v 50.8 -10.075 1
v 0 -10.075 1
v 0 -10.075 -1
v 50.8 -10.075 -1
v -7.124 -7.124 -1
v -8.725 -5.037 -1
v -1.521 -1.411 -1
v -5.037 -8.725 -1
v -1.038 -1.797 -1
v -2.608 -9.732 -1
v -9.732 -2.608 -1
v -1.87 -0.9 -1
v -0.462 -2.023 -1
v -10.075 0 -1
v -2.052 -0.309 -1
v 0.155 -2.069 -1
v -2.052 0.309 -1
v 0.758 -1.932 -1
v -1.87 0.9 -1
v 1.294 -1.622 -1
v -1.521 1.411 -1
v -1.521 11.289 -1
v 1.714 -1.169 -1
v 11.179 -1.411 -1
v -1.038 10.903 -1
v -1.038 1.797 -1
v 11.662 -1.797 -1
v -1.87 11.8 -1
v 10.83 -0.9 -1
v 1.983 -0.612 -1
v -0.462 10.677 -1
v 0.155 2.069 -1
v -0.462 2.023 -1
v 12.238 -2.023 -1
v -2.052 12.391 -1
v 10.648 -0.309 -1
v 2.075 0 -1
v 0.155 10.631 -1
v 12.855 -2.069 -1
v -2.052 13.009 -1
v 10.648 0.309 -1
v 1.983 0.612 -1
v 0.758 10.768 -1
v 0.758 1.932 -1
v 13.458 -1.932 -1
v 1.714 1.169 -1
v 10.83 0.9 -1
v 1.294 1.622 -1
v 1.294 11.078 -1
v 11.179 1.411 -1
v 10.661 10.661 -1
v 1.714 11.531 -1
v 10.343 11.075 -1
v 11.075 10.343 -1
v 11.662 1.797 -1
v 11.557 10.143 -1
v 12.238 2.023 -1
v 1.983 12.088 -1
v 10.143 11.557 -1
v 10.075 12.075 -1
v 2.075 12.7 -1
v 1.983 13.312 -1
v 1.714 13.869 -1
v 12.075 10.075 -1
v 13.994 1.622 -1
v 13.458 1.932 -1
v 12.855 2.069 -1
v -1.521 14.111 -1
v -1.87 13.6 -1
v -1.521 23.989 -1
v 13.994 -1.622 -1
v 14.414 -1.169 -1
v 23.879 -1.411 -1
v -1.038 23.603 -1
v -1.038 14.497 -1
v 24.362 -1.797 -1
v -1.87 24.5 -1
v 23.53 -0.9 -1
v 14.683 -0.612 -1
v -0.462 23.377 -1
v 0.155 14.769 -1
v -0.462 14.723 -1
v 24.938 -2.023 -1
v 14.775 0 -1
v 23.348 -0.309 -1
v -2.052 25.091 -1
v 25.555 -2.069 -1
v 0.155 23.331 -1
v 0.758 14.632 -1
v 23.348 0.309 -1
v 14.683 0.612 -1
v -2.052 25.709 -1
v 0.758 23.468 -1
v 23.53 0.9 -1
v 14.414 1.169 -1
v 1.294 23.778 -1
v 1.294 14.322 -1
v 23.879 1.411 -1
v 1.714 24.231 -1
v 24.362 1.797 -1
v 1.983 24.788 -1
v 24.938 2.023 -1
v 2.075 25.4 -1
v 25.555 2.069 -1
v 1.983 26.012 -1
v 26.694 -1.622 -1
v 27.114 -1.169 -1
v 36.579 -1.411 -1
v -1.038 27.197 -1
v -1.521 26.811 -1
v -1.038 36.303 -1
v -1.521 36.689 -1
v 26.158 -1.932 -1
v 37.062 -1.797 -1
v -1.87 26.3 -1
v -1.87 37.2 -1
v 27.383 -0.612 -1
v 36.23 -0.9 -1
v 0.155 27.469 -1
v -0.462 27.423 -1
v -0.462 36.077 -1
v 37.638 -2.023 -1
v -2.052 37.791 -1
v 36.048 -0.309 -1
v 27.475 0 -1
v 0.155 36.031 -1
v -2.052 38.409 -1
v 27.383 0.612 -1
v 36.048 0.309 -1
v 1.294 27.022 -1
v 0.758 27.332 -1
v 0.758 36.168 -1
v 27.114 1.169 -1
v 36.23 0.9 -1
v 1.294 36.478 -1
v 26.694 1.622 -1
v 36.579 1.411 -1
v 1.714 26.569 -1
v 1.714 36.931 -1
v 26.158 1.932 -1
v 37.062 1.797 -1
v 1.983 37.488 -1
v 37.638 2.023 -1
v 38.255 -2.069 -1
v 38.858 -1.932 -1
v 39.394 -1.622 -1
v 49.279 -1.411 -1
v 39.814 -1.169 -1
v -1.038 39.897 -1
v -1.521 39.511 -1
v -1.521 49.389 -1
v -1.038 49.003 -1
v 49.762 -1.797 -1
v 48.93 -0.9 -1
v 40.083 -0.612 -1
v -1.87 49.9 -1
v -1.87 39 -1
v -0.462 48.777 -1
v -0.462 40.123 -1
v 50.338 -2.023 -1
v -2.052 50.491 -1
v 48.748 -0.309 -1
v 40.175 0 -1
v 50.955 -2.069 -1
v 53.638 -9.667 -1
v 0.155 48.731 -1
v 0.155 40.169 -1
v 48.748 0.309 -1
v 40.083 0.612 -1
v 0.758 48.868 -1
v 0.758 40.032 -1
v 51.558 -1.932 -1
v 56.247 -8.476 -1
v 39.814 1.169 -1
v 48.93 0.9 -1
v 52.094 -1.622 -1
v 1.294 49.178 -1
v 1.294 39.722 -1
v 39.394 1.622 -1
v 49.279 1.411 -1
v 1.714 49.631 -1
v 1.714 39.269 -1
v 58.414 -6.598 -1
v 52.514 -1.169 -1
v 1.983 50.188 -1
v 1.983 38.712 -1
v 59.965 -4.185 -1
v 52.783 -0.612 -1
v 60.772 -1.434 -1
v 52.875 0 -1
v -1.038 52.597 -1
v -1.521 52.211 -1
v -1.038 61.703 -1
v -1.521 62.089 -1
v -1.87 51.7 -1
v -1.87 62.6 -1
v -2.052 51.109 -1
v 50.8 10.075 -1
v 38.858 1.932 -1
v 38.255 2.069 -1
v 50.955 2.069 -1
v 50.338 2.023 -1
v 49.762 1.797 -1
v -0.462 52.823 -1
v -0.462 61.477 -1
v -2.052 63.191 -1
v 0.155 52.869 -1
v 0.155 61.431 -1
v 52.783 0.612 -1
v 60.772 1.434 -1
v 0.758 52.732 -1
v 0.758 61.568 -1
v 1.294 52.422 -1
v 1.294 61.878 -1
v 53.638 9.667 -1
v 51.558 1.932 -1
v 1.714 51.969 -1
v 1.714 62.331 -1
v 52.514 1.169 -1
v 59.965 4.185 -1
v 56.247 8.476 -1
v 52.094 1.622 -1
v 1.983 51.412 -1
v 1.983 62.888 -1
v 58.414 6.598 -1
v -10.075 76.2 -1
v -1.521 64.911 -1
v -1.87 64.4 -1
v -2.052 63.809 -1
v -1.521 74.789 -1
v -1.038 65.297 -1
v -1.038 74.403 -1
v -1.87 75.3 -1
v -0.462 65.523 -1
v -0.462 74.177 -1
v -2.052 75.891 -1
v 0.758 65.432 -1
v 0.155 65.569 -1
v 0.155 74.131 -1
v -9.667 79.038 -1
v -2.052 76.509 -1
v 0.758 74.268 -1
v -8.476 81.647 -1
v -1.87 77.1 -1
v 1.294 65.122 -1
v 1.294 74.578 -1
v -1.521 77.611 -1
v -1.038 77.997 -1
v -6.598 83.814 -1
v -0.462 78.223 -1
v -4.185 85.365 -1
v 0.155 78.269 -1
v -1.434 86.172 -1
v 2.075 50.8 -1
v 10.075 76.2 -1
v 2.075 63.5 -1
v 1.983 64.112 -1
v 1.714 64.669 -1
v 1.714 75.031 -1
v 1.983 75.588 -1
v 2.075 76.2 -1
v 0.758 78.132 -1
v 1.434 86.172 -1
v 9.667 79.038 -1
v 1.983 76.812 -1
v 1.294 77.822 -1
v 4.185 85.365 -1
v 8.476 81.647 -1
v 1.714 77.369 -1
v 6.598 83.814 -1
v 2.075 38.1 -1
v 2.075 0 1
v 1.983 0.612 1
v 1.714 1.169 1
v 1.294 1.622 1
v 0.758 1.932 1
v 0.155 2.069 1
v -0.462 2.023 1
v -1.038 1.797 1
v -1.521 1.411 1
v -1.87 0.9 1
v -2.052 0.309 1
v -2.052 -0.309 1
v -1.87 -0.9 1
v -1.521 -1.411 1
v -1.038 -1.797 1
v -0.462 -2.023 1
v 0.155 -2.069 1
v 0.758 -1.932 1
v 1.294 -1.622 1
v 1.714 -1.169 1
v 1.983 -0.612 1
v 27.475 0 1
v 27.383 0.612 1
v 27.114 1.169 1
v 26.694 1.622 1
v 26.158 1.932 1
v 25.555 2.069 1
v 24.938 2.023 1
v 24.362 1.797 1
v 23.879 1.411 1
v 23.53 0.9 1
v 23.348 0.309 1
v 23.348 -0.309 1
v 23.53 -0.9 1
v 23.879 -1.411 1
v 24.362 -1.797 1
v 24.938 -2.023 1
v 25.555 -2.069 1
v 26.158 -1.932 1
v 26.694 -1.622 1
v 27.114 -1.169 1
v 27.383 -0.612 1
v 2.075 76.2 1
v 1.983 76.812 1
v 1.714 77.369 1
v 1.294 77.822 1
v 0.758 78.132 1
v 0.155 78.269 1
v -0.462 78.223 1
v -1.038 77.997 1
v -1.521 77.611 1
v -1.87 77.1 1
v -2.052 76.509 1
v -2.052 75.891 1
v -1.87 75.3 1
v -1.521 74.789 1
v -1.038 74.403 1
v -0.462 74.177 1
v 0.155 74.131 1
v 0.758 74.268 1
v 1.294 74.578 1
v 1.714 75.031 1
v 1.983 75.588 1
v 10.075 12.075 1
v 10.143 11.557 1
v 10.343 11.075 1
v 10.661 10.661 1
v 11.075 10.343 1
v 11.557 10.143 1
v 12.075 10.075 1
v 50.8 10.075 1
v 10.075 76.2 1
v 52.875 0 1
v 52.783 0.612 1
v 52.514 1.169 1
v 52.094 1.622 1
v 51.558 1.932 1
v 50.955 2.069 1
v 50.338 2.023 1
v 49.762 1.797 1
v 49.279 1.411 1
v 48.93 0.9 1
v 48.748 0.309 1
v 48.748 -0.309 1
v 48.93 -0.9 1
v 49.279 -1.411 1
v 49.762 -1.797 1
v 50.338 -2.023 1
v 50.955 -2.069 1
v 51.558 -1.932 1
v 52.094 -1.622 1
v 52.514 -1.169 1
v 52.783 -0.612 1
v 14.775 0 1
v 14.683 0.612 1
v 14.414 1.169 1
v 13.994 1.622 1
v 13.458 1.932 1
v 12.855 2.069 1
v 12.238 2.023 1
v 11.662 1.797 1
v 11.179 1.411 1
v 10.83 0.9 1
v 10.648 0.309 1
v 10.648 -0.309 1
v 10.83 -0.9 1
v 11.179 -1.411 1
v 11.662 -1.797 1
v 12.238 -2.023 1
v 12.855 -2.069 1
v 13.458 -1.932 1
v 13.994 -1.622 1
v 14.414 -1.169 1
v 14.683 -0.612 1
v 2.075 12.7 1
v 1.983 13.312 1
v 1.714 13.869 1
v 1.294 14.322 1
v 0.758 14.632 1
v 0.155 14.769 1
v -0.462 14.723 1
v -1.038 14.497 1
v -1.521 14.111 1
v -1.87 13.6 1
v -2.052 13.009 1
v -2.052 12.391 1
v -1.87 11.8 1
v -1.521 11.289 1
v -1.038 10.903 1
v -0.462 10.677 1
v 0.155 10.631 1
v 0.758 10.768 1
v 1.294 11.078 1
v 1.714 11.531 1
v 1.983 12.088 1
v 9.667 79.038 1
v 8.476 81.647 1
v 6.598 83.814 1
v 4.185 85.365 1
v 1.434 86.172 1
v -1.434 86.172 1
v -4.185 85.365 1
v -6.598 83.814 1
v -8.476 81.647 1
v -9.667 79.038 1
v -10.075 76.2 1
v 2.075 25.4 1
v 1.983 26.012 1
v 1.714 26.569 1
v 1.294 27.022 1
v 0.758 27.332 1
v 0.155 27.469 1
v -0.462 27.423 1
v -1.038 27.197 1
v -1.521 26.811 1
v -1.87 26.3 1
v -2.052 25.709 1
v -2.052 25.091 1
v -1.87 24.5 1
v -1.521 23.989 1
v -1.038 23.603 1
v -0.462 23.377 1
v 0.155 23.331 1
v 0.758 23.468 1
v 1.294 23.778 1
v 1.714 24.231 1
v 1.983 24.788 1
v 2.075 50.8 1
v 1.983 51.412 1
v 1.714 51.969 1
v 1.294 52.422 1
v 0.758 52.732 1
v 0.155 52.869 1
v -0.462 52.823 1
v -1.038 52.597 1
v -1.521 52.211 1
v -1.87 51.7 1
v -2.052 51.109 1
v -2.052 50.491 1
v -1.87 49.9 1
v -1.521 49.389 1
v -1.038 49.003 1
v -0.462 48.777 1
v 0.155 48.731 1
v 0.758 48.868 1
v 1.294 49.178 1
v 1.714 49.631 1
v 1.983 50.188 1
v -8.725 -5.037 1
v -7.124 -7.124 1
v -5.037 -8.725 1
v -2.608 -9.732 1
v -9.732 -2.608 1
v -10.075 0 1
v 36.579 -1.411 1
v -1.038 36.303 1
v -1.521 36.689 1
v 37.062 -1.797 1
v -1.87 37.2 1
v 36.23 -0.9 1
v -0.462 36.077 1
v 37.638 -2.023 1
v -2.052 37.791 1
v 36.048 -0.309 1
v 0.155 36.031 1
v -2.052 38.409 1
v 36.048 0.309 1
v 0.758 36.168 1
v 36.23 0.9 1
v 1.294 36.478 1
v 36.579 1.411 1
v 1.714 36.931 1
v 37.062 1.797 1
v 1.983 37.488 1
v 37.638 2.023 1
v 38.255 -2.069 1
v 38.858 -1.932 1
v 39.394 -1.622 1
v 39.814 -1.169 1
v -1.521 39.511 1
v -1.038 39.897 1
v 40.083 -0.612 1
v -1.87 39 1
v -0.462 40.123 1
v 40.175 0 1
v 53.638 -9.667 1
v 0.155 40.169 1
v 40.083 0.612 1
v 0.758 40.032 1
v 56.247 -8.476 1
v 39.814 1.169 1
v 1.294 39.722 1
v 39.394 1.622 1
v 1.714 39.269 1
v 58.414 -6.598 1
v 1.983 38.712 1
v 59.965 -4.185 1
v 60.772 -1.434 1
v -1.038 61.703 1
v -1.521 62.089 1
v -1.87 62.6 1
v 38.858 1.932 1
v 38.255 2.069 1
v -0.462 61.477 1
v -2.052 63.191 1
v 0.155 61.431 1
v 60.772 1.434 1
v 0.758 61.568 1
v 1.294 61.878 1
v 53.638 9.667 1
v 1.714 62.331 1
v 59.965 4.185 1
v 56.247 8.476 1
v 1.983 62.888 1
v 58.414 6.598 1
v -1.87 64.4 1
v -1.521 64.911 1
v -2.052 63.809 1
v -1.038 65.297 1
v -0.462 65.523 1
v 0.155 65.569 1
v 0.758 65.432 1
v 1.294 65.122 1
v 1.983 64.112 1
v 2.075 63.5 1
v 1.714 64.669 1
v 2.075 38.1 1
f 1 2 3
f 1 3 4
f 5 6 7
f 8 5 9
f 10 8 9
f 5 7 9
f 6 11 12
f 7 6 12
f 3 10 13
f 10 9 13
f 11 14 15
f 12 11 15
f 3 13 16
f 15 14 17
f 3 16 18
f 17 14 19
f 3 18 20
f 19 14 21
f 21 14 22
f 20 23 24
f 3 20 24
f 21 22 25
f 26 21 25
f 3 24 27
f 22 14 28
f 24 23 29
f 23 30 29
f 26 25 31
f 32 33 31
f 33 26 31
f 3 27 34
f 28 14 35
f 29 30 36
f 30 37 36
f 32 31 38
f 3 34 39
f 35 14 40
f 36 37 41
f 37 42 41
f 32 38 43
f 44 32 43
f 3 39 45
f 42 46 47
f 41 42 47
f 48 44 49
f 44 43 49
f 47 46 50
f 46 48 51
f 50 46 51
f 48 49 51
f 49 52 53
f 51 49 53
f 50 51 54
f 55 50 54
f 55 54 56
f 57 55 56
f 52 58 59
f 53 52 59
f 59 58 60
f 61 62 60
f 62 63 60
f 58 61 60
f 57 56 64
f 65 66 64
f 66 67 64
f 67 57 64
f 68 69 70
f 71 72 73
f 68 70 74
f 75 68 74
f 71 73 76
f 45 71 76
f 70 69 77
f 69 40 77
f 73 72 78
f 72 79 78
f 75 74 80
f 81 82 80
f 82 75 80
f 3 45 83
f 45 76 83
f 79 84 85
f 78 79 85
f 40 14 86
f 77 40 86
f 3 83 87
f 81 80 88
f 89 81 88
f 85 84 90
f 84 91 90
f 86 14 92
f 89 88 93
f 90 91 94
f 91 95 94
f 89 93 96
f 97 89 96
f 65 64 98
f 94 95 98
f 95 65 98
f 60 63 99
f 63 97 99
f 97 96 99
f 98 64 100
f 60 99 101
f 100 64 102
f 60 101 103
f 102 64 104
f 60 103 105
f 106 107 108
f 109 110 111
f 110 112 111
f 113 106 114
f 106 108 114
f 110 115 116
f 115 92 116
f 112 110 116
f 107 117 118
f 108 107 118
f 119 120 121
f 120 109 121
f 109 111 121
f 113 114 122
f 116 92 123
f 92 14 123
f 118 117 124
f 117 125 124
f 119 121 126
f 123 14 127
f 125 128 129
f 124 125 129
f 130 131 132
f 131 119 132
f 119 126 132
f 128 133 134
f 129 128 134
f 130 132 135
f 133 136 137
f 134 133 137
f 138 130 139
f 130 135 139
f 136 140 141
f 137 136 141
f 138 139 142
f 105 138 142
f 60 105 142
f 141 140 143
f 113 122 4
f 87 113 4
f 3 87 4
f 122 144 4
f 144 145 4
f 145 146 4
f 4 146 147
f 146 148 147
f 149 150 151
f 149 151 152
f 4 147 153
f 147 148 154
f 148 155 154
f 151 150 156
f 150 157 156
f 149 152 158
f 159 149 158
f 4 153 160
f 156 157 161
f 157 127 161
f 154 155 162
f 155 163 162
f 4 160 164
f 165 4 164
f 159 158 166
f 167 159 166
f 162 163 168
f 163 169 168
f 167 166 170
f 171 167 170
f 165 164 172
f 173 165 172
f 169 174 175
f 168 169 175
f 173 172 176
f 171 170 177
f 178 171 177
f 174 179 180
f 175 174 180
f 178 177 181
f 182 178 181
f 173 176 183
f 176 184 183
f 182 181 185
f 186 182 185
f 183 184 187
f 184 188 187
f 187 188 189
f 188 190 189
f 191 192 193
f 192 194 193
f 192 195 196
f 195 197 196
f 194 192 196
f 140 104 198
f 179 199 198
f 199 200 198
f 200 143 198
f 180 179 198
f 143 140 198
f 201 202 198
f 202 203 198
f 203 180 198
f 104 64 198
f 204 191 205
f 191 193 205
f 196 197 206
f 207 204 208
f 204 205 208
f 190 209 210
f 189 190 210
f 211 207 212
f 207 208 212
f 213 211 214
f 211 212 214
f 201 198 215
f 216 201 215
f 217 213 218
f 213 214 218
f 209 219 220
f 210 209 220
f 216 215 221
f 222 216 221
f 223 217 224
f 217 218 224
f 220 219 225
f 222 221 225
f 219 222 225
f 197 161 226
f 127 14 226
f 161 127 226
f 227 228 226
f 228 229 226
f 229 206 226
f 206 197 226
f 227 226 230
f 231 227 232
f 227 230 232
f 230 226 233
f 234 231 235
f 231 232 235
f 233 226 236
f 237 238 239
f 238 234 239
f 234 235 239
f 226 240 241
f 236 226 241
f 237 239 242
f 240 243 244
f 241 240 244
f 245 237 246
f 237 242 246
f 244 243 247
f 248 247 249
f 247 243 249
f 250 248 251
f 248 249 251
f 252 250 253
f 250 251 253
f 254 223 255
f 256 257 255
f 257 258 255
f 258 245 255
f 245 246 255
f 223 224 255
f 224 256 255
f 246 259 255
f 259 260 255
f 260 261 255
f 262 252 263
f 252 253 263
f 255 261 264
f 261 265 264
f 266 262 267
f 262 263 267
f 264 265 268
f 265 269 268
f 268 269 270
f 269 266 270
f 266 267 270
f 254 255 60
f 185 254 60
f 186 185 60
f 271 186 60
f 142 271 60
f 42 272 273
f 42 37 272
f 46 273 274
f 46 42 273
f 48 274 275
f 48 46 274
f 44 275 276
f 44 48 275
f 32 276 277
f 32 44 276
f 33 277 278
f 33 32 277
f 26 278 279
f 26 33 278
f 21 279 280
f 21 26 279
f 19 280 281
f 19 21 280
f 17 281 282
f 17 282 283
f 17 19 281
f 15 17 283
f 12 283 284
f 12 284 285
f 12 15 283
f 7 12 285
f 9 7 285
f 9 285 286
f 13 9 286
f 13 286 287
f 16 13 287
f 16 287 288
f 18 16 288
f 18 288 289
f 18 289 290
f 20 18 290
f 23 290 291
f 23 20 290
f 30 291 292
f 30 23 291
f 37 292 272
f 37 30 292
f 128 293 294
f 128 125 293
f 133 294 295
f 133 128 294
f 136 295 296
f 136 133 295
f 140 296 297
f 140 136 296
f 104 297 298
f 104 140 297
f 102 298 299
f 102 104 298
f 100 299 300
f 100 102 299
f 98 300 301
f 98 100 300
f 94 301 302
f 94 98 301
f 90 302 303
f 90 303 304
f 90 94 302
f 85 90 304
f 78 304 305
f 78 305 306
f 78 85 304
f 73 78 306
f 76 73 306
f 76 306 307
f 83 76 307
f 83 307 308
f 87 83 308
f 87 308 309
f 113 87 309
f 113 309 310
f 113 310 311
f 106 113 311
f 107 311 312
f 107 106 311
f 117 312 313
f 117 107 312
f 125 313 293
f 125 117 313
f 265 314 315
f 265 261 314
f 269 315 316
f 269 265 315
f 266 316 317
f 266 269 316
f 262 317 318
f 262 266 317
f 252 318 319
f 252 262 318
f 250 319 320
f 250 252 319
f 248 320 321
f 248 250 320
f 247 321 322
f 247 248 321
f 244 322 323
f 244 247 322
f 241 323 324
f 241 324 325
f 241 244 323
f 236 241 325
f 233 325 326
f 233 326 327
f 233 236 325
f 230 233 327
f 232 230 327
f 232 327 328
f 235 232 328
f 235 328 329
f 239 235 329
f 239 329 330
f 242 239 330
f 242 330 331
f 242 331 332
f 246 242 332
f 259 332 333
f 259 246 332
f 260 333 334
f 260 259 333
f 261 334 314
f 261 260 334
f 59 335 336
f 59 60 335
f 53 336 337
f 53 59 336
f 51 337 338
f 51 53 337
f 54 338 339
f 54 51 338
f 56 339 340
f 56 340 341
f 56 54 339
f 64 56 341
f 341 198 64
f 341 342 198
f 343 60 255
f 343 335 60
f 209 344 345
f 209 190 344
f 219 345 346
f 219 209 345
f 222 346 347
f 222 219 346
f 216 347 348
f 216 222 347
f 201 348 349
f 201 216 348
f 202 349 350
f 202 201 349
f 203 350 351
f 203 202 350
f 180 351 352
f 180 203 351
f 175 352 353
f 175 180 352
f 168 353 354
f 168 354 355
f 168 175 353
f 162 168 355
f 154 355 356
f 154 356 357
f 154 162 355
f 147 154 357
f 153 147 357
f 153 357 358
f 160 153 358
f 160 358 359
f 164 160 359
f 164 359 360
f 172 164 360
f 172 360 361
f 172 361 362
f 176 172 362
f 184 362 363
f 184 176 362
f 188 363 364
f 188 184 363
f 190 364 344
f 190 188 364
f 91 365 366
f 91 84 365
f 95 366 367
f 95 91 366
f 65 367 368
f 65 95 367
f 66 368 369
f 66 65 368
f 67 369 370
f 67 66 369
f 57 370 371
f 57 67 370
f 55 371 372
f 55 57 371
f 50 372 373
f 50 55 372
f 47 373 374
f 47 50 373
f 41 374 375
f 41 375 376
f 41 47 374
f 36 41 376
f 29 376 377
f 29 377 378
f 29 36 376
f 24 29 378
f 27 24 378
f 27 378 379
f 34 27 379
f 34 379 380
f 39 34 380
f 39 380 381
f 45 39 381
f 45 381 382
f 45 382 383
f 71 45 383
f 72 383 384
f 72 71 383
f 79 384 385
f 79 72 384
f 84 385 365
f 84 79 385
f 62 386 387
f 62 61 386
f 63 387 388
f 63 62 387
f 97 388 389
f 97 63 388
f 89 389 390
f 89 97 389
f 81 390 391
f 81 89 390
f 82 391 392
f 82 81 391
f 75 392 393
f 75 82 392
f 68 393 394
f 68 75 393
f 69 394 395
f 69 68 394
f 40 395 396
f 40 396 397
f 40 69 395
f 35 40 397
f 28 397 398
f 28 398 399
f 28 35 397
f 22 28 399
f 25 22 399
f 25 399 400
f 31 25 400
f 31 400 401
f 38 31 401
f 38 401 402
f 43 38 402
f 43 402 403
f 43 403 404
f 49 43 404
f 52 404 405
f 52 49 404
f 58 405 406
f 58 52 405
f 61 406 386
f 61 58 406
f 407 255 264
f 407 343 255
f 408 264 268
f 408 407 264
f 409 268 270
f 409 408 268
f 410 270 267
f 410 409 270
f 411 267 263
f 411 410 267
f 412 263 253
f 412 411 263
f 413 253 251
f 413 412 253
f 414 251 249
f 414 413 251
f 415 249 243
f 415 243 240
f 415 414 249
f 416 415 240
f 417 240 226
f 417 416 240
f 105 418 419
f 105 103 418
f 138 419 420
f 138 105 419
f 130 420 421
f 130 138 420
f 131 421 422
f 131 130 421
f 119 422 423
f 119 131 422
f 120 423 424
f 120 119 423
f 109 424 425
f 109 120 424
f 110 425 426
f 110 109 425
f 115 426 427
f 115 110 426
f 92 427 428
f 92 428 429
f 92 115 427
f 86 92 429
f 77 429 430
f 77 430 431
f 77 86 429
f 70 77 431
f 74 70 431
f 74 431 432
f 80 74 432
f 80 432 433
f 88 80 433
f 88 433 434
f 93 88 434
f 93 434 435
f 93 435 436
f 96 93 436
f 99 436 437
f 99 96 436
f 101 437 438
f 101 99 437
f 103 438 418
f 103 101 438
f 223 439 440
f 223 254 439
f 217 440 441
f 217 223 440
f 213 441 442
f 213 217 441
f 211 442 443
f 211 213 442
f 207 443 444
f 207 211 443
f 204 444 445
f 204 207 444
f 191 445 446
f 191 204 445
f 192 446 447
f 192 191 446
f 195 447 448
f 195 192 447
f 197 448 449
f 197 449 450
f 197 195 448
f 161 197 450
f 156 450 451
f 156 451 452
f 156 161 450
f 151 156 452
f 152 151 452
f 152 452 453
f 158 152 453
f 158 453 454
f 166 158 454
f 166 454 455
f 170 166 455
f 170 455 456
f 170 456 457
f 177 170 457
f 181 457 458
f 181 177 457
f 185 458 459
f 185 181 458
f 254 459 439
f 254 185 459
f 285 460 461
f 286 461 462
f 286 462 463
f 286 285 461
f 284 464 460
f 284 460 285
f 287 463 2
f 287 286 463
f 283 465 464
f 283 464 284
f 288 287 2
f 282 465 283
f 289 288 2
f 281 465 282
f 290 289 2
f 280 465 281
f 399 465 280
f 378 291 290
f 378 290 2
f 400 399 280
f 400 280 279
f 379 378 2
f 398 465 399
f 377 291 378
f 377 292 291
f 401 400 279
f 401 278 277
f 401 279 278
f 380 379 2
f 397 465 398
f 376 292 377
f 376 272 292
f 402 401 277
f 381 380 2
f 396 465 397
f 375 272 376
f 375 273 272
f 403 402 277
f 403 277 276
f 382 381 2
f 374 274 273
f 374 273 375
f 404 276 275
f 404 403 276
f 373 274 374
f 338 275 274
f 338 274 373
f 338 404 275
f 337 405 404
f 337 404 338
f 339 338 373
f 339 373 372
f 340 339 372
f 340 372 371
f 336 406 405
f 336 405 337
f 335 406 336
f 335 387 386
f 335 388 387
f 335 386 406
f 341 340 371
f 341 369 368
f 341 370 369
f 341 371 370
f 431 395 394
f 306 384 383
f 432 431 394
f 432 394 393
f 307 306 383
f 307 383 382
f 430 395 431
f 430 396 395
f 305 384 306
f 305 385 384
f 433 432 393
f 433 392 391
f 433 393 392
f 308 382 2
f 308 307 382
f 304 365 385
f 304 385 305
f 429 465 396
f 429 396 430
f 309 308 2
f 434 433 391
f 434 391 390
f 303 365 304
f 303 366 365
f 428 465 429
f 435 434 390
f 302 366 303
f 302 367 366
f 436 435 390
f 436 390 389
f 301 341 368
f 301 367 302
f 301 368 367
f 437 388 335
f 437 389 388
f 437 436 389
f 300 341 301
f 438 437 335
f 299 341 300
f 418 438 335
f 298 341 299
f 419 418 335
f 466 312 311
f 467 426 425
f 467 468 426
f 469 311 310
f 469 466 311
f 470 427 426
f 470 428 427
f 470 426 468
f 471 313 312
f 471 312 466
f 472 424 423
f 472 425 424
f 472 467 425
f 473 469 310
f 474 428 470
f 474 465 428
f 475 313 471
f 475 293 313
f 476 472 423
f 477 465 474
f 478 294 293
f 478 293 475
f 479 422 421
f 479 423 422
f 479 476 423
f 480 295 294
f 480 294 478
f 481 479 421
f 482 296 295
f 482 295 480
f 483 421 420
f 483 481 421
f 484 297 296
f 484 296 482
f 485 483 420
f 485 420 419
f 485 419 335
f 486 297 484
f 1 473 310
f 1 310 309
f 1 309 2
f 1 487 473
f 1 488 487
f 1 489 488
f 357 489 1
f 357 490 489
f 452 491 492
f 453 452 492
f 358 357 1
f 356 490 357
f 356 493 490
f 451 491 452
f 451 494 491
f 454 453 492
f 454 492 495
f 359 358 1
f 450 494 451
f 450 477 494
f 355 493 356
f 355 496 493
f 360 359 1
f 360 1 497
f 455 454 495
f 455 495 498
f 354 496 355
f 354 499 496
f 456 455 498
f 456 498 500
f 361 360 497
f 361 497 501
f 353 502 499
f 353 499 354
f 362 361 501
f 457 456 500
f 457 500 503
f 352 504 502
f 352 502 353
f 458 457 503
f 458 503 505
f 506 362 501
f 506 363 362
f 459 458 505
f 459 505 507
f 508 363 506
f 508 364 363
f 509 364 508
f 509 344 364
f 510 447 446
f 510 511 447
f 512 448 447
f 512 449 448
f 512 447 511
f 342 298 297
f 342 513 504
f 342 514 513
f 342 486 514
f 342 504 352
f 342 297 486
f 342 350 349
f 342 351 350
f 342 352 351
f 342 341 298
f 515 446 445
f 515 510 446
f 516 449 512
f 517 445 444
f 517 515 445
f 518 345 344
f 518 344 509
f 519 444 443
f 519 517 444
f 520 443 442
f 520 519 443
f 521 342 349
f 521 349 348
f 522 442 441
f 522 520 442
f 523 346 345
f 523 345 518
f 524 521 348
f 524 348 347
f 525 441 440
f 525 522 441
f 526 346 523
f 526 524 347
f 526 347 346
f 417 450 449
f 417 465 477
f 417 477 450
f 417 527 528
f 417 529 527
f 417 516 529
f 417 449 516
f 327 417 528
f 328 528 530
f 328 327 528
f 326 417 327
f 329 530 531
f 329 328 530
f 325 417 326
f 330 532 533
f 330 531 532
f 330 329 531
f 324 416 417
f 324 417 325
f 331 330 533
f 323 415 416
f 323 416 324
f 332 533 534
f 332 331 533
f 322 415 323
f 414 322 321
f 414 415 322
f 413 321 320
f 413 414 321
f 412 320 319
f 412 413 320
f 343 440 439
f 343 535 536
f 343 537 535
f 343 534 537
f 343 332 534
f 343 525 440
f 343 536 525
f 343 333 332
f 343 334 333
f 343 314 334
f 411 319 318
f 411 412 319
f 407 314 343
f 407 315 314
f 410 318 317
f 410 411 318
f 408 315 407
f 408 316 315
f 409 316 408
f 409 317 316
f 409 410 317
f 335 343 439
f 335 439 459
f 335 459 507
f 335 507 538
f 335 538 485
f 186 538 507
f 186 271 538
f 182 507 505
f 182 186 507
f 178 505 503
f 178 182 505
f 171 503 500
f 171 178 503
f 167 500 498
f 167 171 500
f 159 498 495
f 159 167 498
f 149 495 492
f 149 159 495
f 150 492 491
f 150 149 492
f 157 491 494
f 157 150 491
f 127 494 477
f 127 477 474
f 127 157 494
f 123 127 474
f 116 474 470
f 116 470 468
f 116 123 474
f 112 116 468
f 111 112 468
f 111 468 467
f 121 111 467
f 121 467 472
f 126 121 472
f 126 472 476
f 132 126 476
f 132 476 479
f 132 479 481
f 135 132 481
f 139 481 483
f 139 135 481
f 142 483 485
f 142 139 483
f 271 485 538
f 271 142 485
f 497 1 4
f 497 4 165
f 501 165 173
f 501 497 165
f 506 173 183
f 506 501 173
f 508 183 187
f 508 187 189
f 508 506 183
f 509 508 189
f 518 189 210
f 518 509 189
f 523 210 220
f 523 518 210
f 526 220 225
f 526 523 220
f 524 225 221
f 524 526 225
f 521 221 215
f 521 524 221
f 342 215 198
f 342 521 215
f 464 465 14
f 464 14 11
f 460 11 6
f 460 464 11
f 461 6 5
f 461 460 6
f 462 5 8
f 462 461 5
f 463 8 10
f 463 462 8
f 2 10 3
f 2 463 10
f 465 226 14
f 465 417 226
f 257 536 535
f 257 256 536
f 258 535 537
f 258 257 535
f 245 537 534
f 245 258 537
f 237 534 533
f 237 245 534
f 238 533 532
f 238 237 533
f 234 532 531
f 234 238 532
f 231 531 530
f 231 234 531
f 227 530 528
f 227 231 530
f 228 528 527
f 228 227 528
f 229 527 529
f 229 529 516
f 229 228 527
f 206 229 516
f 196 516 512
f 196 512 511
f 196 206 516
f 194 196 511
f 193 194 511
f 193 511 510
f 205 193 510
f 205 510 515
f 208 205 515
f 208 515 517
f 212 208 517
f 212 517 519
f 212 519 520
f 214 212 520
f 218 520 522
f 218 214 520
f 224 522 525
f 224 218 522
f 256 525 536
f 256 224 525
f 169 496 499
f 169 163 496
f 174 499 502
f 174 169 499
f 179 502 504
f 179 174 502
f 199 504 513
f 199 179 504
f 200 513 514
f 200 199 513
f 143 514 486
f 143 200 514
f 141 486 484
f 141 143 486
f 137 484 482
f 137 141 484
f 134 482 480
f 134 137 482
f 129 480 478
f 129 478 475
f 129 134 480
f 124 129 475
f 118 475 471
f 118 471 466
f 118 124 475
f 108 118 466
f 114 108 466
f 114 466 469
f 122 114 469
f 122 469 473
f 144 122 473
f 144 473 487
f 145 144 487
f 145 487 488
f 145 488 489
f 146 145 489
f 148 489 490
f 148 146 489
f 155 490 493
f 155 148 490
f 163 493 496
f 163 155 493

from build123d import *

# Parameters (mm, degrees)
SKETCH1_R           = 2.075
BOSS_EXTRUDE1_DEPTH = 1
FILLET1_R           = 2


with BuildPart() as part:
    # Sketch1 → Boss-Extrude1 (new, symmetric)
    with BuildSketch(Plane.XY):
        with BuildLine():
            Line((-10.075, 76.2), (-10.075, 0))
            ThreePointArc((-10.075, 0), (-7.12410082, -7.12410082), (0, -10.075))
            Line((0, -10.075), (50.8, -10.075))
            ThreePointArc((50.8, -10.075), (60.875, 0), (50.8, 10.075))
            Line((50.8, 10.075), (10.075, 10.075))
            Line((10.075, 10.075), (10.075, 76.2))
            ThreePointArc((10.075, 76.2), (0, 86.275), (-10.075, 76.2))
        make_face()
        Circle(SKETCH1_R, mode=Mode.SUBTRACT)
        with Locations((12.7, 0)):
            Circle(SKETCH1_R, mode=Mode.SUBTRACT)
        with Locations((25.4, 0)):
            Circle(SKETCH1_R, mode=Mode.SUBTRACT)
        with Locations((38.1, 0)):
            Circle(SKETCH1_R, mode=Mode.SUBTRACT)
        with Locations((50.8, 0)):
            Circle(SKETCH1_R, mode=Mode.SUBTRACT)
        with Locations((0, 12.7)):
            Circle(SKETCH1_R, mode=Mode.SUBTRACT)
        with Locations((0, 25.4)):
            Circle(SKETCH1_R, mode=Mode.SUBTRACT)
        with Locations((0, 38.1)):
            Circle(SKETCH1_R, mode=Mode.SUBTRACT)
        with Locations((0, 50.8)):
            Circle(SKETCH1_R, mode=Mode.SUBTRACT)
        with Locations((0, 63.5)):
            Circle(SKETCH1_R, mode=Mode.SUBTRACT)
        with Locations((0, 76.2)):
            Circle(SKETCH1_R, mode=Mode.SUBTRACT)
    extrude(amount=BOSS_EXTRUDE1_DEPTH, both=True)

    # Fillet1
    fillet1_edges = [part.edges().sort_by_distance(p)[0] for p in [
        (10.075, 10.075, 0),
    ]]
    fillet(fillet1_edges, radius=FILLET1_R)


solid = part.part
